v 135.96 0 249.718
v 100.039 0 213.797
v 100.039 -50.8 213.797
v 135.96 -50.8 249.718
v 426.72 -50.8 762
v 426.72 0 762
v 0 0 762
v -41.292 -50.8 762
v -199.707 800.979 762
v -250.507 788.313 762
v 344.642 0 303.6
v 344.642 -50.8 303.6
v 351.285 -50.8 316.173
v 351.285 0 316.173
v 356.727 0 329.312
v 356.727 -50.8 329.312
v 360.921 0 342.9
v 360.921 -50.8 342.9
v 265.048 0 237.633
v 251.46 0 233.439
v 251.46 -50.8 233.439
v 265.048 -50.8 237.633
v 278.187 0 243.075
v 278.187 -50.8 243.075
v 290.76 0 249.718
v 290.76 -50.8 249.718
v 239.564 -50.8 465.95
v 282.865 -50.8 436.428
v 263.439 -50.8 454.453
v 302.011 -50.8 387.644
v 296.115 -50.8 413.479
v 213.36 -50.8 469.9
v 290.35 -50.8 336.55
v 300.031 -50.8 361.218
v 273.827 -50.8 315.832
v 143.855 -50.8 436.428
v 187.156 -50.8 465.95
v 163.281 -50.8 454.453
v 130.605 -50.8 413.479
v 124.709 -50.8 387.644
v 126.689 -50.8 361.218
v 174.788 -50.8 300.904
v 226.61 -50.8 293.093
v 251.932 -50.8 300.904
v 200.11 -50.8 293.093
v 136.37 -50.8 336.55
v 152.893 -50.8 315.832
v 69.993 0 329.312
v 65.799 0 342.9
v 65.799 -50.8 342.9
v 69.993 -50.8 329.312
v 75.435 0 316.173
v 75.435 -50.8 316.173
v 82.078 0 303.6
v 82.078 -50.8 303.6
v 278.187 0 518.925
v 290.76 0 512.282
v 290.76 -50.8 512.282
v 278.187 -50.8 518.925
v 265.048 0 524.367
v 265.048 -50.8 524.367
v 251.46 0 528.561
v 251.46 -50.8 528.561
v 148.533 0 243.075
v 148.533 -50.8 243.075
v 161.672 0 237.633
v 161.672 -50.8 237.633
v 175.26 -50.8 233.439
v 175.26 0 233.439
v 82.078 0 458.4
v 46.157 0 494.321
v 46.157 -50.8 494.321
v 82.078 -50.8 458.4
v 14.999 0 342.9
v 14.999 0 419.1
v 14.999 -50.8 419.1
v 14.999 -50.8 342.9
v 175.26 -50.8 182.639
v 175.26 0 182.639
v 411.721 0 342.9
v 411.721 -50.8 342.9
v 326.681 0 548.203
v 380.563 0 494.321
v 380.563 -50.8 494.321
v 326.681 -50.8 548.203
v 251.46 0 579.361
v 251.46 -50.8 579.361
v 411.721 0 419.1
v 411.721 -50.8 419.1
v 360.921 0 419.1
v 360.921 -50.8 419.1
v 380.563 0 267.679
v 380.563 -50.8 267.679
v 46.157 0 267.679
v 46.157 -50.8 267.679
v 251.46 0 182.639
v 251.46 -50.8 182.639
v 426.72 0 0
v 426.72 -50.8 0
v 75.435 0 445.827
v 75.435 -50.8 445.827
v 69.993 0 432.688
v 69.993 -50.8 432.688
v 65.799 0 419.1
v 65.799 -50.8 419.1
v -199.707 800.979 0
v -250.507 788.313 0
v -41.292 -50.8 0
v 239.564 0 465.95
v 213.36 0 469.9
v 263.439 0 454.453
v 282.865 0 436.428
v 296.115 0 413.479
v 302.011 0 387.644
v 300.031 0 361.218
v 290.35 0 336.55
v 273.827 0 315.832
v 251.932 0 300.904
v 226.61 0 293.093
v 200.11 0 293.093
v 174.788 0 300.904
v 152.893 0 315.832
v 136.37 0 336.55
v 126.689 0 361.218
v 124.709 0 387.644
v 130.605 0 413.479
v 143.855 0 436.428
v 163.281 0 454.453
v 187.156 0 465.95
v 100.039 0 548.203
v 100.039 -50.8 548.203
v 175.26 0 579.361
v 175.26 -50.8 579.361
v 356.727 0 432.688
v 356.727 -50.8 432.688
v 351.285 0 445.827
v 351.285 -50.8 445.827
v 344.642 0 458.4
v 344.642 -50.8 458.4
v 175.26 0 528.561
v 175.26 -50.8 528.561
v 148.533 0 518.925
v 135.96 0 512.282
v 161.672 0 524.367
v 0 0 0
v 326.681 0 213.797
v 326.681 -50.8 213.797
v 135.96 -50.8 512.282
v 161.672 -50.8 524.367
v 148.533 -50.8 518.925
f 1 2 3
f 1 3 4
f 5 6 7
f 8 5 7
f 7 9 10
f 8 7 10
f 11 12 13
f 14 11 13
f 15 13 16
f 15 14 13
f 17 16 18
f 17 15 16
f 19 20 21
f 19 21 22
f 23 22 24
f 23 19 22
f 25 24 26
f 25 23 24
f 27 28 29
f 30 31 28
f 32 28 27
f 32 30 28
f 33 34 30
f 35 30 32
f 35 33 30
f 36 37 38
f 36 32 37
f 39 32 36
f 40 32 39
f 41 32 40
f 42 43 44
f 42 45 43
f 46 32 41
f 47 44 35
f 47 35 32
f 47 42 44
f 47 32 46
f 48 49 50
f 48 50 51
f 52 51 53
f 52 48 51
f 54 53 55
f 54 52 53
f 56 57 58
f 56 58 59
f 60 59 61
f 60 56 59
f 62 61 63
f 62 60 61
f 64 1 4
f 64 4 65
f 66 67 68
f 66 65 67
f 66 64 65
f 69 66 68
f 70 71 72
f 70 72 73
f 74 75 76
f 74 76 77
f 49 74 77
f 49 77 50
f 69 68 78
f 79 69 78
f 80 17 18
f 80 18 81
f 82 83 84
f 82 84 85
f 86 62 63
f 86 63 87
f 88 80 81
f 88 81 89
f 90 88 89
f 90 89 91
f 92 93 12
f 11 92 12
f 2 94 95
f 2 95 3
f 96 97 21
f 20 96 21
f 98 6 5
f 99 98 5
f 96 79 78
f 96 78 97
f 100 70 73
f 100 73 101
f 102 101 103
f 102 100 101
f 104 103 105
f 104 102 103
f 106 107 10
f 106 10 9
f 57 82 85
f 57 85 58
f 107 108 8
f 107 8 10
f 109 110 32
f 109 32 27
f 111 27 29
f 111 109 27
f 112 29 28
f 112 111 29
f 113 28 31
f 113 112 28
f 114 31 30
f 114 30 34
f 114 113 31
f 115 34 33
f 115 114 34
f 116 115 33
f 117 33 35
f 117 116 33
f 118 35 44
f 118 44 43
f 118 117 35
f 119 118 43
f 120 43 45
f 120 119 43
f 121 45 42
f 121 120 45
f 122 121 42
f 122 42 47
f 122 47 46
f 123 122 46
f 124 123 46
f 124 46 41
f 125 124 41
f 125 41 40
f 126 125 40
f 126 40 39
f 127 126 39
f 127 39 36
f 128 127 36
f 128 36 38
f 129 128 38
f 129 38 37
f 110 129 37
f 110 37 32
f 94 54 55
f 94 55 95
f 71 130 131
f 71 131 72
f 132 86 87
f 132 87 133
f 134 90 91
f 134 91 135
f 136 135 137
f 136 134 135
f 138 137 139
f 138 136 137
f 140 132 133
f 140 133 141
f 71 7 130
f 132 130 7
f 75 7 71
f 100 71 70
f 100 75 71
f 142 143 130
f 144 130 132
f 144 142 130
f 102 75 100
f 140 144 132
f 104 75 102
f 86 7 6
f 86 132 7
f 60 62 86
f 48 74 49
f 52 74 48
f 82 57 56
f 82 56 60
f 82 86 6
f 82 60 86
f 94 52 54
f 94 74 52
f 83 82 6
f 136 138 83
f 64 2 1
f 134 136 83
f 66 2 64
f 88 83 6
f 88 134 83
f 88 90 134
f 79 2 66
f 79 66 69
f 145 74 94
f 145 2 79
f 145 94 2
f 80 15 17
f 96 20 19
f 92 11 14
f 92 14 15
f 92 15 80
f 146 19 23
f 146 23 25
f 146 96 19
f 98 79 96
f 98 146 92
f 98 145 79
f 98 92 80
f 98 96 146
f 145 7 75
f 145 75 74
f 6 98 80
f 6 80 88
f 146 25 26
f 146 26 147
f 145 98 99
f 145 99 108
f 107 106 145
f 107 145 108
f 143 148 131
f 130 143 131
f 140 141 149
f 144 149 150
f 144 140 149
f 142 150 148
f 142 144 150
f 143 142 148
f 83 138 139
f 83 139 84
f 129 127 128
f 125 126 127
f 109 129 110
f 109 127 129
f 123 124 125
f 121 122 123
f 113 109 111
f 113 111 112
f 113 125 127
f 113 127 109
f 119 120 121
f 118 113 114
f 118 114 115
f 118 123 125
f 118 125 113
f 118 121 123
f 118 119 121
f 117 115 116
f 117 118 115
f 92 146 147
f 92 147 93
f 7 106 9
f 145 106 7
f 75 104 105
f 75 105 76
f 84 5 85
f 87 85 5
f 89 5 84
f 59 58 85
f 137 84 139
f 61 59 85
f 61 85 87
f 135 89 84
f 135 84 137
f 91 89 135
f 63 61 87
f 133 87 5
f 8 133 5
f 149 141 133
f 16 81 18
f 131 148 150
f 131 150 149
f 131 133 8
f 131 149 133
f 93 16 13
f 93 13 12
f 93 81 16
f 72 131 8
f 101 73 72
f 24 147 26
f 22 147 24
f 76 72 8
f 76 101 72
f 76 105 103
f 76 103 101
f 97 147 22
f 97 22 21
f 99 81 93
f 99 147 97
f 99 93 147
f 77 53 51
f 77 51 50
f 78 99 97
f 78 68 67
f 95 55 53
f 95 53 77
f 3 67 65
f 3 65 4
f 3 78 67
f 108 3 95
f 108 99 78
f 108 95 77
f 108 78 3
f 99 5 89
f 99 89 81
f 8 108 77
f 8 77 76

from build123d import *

# Parameters (mm, degrees)
BOSS_EXTRUDE1_DEPTH = 762
SKETCH2_R           = 88.9
CUT_EXTRUDE1_DEPTH  = 1016


with BuildPart() as part:
    # Sketch1 → Boss-Extrude1 (new body)
    with BuildSketch(Plane.XY):
        Polygon((0, 0), (426.72, 0), (426.72, -50.8), (-41.292091668, -50.8), (-250.506524818, 788.313259496), (-199.706524818, 800.979122041), align=None)
    extrude(amount=BOSS_EXTRUDE1_DEPTH)

    # Sketch2 → Cut-Extrude1 (cut)
    with BuildSketch(Plane(origin=(0, 0, 0), x_dir=(1, 0, 0), z_dir=(0, 1, 0))):
        with BuildLine():
            Line((175.26, -182.639334509), (251.46, -182.639334509))
            Line((251.46, -182.639334509), (251.46, -233.439334509))
            ThreePointArc((251.46, -233.439334509), (271.680955092, -240.200759245), (290.760378842, -249.718084432))
            Line((290.760378842, -249.718084432), (326.681403326, -213.797059948))
            Line((326.681403326, -213.797059948), (380.562940052, -267.678596674))
            Line((380.562940052, -267.678596674), (344.641915568, -303.599621158))
            ThreePointArc((344.641915568, -303.599621158), (354.159240755, -322.679044908), (360.920665491, -342.9))
            Line((360.920665491, -342.9), (411.720665491, -342.9))
            Line((411.720665491, -342.9), (411.720665491, -419.1))
            Line((411.720665491, -419.1), (360.920665491, -419.1))
            ThreePointArc((360.920665491, -419.1), (354.159240755, -439.320955092), (344.641915568, -458.400378842))
            Line((344.641915568, -458.400378842), (380.562940052, -494.321403326))
            Line((380.562940052, -494.321403326), (326.681403326, -548.202940052))
            Line((326.681403326, -548.202940052), (290.760378842, -512.281915568))
            ThreePointArc((290.760378842, -512.281915568), (271.680955092, -521.799240755), (251.46, -528.560665491))
            Line((251.46, -528.560665491), (251.46, -579.360665491))
            Line((251.46, -579.360665491), (175.26, -579.360665491))
            Line((175.26, -579.360665491), (175.26, -528.560665491))
            ThreePointArc((175.26, -528.560665491), (155.039044908, -521.799240755), (135.959621158, -512.281915568))
            Line((135.959621158, -512.281915568), (100.038596674, -548.202940052))
            Line((100.038596674, -548.202940052), (46.157059948, -494.321403326))
            Line((46.157059948, -494.321403326), (82.078084432, -458.400378842))
            ThreePointArc((82.078084432, -458.400378842), (72.560759245, -439.320955092), (65.79933451, -419.1))
            Line((65.79933451, -419.1), (14.99933451, -419.1))
            Line((14.99933451, -419.1), (14.99933451, -342.9))
            Line((14.99933451, -342.9), (65.79933451, -342.9))
            ThreePointArc((65.79933451, -342.9), (72.560759245, -322.679044908), (82.078084432, -303.599621158))
            Line((82.078084432, -303.599621158), (46.157059948, -267.678596674))
            Line((46.157059948, -267.678596674), (100.038596674, -213.797059948))
            Line((100.038596674, -213.797059948), (135.959621158, -249.718084432))
            ThreePointArc((135.959621158, -249.718084432), (155.039044908, -240.200759245), (175.26, -233.439334509))
            Line((175.26, -233.439334509), (175.26, -182.639334509))
        make_face()
        with Locations(Location((213.36, -381, 0), (0, 0, 270))):
            Circle(SKETCH2_R, mode=Mode.SUBTRACT)
    extrude(amount=-CUT_EXTRUDE1_DEPTH, mode=Mode.SUBTRACT)


with BuildPart() as cut_extrude1_piece_1:
    # of the separate pieces the step leaves, piece 1, a body of its own (cut_extrude1_pieces)
    add(part.part.solids().sort_by_distance((0, 0, 0))[0])


with BuildPart() as cut_extrude1_piece_2:
    # of the separate pieces the step leaves, piece 2, a body of its own (cut_extrude1_pieces)
    add(part.part.solids().sort_by_distance((213.36, 0, 469.9))[0])


solid = Compound([cut_extrude1_piece_1.part, cut_extrude1_piece_2.part])
